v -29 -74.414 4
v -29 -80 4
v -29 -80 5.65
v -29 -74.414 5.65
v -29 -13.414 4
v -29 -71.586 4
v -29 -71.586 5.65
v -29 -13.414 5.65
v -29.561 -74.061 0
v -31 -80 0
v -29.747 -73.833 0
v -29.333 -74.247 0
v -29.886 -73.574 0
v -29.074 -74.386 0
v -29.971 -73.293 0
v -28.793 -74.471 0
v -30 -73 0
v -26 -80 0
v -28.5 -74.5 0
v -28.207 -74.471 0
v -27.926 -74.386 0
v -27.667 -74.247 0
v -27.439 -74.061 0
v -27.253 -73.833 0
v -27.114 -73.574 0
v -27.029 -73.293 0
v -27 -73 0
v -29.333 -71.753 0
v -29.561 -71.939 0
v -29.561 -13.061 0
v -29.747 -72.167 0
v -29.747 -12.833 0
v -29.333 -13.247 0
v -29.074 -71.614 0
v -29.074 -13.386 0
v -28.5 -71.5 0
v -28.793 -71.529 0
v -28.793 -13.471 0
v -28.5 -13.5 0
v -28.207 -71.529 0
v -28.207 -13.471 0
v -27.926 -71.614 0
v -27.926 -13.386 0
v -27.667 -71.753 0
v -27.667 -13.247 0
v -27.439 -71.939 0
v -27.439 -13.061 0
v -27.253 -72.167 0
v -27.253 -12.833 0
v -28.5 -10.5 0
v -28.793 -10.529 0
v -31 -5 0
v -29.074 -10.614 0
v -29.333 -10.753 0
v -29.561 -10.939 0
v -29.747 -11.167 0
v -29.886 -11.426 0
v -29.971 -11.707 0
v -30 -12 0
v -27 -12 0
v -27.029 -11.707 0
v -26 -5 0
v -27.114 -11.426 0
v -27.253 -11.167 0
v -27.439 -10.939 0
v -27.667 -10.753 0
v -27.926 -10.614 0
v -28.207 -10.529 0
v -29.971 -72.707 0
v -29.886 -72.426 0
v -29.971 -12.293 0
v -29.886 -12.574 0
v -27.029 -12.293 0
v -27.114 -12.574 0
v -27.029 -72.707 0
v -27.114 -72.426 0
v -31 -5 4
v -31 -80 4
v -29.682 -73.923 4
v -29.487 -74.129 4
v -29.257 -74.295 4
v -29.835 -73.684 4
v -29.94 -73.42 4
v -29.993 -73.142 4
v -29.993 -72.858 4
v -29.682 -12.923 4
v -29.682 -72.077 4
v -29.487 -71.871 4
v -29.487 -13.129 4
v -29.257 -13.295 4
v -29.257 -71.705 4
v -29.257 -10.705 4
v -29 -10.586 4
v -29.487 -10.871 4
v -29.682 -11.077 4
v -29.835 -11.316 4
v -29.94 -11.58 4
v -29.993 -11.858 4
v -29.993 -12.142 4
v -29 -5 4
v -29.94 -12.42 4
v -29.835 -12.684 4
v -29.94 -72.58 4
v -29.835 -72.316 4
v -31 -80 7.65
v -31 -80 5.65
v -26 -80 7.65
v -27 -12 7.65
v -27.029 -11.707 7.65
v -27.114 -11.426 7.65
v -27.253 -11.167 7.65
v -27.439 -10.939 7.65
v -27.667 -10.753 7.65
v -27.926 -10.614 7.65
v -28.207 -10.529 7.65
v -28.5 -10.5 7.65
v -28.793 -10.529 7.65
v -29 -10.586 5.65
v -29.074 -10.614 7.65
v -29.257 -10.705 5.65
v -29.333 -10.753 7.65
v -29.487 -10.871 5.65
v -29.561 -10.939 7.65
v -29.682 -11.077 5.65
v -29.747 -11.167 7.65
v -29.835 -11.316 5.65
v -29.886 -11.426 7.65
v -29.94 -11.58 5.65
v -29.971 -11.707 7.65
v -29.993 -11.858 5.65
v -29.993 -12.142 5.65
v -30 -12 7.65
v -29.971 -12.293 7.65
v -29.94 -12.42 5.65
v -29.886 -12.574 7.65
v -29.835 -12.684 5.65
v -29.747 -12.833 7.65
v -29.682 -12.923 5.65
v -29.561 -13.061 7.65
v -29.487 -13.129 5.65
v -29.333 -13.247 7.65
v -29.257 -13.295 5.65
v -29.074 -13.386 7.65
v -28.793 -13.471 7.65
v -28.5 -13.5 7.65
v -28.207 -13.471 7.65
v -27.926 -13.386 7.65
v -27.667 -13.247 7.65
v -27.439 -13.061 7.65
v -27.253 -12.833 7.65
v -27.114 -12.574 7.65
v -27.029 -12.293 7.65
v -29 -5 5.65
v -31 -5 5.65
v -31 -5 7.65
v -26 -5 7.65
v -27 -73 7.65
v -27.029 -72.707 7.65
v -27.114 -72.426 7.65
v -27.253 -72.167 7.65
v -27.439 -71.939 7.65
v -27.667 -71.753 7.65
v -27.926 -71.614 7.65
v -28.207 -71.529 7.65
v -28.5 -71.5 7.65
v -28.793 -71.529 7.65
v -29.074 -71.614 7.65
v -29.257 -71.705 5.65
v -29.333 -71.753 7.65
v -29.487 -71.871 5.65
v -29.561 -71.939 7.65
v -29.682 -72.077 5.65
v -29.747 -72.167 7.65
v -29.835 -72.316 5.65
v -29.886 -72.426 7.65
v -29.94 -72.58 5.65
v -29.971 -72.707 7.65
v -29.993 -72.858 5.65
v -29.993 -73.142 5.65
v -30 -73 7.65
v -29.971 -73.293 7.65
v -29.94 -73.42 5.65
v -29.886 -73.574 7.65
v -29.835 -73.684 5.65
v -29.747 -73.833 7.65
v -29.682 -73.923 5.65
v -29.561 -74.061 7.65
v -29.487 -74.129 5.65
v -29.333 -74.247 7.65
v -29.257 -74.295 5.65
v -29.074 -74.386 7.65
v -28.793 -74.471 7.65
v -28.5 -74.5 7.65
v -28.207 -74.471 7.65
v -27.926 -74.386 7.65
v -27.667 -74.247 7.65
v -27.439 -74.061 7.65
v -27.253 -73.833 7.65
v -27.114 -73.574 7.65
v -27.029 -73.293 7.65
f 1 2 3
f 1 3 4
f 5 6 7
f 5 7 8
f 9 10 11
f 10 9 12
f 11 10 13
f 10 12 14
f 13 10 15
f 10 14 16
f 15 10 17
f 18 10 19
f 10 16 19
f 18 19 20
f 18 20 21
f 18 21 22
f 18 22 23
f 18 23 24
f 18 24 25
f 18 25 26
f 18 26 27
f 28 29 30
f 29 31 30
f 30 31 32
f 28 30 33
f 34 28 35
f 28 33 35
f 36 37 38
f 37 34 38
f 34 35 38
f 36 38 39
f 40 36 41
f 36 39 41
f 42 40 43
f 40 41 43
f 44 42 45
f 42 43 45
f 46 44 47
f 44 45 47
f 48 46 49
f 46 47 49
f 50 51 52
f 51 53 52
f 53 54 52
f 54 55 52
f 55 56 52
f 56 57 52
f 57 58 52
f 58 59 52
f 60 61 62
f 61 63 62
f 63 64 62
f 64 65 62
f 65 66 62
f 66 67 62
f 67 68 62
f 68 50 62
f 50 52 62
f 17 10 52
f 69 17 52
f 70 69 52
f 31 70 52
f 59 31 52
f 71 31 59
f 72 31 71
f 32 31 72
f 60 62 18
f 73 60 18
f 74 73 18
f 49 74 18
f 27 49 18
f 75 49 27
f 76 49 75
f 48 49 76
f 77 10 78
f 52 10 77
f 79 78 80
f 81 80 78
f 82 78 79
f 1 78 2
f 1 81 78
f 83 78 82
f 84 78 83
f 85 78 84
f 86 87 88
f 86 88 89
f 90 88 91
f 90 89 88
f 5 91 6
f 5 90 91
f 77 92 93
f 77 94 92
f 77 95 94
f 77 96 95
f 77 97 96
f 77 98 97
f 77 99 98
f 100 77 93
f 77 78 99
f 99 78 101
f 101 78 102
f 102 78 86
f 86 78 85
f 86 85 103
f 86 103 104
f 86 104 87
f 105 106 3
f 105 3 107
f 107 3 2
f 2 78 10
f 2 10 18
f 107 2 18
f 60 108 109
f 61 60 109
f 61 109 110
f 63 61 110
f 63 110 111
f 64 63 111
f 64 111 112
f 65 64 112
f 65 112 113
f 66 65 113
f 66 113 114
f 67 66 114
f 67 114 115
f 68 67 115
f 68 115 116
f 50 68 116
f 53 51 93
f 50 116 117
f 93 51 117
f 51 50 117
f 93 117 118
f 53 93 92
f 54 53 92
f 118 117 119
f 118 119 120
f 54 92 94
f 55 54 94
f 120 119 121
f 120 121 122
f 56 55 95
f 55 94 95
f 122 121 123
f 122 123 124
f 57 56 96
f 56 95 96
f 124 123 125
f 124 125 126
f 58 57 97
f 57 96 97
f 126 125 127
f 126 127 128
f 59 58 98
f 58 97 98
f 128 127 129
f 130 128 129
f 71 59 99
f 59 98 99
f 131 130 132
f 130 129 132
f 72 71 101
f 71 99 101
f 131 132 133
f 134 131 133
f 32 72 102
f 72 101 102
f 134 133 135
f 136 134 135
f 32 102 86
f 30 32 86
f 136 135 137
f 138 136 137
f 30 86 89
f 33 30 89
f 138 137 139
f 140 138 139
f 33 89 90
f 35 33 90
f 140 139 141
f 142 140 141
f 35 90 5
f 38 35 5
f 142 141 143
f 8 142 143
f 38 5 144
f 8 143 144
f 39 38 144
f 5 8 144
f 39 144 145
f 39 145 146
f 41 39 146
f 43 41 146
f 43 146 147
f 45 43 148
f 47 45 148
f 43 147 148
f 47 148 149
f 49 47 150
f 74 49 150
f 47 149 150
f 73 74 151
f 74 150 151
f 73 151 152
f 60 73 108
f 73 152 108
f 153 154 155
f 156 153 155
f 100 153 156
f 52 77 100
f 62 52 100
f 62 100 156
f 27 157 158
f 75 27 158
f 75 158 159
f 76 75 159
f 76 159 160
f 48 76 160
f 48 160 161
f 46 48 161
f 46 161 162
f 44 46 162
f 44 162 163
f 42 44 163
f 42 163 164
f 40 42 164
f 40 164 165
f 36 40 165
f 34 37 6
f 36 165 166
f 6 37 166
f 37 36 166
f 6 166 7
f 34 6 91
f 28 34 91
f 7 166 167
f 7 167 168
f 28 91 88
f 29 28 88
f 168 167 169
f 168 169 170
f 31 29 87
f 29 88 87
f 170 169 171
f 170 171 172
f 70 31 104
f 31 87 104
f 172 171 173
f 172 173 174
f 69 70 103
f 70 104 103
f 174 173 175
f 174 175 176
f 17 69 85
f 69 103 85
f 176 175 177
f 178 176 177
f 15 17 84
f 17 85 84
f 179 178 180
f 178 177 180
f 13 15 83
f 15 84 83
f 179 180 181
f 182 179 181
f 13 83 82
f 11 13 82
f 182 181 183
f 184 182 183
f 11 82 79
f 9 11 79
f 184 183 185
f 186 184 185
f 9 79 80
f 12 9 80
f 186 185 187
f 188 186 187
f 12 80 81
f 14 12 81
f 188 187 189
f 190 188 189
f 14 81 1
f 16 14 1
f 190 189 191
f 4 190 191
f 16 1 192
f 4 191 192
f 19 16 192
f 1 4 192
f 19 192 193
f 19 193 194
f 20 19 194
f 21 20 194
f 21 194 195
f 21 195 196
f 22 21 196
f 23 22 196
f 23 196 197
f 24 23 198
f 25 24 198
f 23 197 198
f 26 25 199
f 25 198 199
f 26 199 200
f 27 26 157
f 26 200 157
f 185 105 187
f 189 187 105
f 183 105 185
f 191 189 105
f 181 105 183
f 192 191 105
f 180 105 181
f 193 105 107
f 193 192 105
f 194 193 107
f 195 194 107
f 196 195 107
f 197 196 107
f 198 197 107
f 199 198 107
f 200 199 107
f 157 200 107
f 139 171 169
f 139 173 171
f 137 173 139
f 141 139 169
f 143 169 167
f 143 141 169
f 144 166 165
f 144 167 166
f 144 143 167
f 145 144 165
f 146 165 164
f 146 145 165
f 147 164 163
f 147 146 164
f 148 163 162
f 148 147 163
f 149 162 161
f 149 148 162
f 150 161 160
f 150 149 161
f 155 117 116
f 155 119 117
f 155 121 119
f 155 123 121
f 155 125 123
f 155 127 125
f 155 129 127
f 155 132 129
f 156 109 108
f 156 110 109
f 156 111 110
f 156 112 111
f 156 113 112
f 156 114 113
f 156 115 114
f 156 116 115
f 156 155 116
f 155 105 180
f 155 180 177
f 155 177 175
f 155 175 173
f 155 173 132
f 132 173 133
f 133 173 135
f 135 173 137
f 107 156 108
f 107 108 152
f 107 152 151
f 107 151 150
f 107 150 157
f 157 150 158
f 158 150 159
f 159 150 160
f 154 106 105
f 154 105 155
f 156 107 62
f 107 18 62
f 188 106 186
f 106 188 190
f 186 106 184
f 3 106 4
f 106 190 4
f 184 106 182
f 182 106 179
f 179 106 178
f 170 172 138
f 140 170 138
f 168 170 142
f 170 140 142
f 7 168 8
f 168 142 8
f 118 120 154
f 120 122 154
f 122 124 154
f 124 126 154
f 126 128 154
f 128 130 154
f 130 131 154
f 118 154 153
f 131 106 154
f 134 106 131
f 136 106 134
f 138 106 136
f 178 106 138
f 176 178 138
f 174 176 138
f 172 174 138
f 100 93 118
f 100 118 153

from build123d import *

# Parameters (mm, degrees)
SKETCH1_W           = 5
SKETCH1_H           = 75
BOSS_EXTRUDE1_DEPTH = 4
SKETCH2_W           = 3
SKETCH2_H           = 75
BOSS_EXTRUDE2_DEPTH = 1.65
SKETCH3_W           = 5
SKETCH3_H           = 75
BOSS_EXTRUDE3_DEPTH = 2
SKETCH4_R           = 1.5
CUT_EXTRUDE1_DEPTH  = 87.136650155


with BuildPart() as part:
    # Sketch1 → Boss-Extrude1 (new body)
    with BuildSketch(Plane.XY):
        with Locations((-28.5, -42.5)):
            Rectangle(SKETCH1_W, SKETCH1_H)
    extrude(amount=BOSS_EXTRUDE1_DEPTH)

    # Sketch2 → Boss-Extrude2 (add)
    with BuildSketch(Plane.XY.offset(4)):
        with Locations((-27.5, -42.5)):
            Rectangle(SKETCH2_W, SKETCH2_H)
    extrude(amount=BOSS_EXTRUDE2_DEPTH)

    # Sketch3 → Boss-Extrude3 (add)
    with BuildSketch(Plane.XY.offset(5.65)):
        with Locations((-28.5, -42.5)):
            Rectangle(SKETCH3_W, SKETCH3_H)
    extrude(amount=BOSS_EXTRUDE3_DEPTH)

    # Sketch4 → Cut-Extrude1 (cut, through all)
    with BuildSketch(Plane.XY.offset(7.65)):
        with Locations((-28.5, -73)):
            Circle(SKETCH4_R)
        with Locations((-28.5, -12)):
            Circle(SKETCH4_R)
    extrude(amount=-CUT_EXTRUDE1_DEPTH, mode=Mode.SUBTRACT)


solid = part.part
